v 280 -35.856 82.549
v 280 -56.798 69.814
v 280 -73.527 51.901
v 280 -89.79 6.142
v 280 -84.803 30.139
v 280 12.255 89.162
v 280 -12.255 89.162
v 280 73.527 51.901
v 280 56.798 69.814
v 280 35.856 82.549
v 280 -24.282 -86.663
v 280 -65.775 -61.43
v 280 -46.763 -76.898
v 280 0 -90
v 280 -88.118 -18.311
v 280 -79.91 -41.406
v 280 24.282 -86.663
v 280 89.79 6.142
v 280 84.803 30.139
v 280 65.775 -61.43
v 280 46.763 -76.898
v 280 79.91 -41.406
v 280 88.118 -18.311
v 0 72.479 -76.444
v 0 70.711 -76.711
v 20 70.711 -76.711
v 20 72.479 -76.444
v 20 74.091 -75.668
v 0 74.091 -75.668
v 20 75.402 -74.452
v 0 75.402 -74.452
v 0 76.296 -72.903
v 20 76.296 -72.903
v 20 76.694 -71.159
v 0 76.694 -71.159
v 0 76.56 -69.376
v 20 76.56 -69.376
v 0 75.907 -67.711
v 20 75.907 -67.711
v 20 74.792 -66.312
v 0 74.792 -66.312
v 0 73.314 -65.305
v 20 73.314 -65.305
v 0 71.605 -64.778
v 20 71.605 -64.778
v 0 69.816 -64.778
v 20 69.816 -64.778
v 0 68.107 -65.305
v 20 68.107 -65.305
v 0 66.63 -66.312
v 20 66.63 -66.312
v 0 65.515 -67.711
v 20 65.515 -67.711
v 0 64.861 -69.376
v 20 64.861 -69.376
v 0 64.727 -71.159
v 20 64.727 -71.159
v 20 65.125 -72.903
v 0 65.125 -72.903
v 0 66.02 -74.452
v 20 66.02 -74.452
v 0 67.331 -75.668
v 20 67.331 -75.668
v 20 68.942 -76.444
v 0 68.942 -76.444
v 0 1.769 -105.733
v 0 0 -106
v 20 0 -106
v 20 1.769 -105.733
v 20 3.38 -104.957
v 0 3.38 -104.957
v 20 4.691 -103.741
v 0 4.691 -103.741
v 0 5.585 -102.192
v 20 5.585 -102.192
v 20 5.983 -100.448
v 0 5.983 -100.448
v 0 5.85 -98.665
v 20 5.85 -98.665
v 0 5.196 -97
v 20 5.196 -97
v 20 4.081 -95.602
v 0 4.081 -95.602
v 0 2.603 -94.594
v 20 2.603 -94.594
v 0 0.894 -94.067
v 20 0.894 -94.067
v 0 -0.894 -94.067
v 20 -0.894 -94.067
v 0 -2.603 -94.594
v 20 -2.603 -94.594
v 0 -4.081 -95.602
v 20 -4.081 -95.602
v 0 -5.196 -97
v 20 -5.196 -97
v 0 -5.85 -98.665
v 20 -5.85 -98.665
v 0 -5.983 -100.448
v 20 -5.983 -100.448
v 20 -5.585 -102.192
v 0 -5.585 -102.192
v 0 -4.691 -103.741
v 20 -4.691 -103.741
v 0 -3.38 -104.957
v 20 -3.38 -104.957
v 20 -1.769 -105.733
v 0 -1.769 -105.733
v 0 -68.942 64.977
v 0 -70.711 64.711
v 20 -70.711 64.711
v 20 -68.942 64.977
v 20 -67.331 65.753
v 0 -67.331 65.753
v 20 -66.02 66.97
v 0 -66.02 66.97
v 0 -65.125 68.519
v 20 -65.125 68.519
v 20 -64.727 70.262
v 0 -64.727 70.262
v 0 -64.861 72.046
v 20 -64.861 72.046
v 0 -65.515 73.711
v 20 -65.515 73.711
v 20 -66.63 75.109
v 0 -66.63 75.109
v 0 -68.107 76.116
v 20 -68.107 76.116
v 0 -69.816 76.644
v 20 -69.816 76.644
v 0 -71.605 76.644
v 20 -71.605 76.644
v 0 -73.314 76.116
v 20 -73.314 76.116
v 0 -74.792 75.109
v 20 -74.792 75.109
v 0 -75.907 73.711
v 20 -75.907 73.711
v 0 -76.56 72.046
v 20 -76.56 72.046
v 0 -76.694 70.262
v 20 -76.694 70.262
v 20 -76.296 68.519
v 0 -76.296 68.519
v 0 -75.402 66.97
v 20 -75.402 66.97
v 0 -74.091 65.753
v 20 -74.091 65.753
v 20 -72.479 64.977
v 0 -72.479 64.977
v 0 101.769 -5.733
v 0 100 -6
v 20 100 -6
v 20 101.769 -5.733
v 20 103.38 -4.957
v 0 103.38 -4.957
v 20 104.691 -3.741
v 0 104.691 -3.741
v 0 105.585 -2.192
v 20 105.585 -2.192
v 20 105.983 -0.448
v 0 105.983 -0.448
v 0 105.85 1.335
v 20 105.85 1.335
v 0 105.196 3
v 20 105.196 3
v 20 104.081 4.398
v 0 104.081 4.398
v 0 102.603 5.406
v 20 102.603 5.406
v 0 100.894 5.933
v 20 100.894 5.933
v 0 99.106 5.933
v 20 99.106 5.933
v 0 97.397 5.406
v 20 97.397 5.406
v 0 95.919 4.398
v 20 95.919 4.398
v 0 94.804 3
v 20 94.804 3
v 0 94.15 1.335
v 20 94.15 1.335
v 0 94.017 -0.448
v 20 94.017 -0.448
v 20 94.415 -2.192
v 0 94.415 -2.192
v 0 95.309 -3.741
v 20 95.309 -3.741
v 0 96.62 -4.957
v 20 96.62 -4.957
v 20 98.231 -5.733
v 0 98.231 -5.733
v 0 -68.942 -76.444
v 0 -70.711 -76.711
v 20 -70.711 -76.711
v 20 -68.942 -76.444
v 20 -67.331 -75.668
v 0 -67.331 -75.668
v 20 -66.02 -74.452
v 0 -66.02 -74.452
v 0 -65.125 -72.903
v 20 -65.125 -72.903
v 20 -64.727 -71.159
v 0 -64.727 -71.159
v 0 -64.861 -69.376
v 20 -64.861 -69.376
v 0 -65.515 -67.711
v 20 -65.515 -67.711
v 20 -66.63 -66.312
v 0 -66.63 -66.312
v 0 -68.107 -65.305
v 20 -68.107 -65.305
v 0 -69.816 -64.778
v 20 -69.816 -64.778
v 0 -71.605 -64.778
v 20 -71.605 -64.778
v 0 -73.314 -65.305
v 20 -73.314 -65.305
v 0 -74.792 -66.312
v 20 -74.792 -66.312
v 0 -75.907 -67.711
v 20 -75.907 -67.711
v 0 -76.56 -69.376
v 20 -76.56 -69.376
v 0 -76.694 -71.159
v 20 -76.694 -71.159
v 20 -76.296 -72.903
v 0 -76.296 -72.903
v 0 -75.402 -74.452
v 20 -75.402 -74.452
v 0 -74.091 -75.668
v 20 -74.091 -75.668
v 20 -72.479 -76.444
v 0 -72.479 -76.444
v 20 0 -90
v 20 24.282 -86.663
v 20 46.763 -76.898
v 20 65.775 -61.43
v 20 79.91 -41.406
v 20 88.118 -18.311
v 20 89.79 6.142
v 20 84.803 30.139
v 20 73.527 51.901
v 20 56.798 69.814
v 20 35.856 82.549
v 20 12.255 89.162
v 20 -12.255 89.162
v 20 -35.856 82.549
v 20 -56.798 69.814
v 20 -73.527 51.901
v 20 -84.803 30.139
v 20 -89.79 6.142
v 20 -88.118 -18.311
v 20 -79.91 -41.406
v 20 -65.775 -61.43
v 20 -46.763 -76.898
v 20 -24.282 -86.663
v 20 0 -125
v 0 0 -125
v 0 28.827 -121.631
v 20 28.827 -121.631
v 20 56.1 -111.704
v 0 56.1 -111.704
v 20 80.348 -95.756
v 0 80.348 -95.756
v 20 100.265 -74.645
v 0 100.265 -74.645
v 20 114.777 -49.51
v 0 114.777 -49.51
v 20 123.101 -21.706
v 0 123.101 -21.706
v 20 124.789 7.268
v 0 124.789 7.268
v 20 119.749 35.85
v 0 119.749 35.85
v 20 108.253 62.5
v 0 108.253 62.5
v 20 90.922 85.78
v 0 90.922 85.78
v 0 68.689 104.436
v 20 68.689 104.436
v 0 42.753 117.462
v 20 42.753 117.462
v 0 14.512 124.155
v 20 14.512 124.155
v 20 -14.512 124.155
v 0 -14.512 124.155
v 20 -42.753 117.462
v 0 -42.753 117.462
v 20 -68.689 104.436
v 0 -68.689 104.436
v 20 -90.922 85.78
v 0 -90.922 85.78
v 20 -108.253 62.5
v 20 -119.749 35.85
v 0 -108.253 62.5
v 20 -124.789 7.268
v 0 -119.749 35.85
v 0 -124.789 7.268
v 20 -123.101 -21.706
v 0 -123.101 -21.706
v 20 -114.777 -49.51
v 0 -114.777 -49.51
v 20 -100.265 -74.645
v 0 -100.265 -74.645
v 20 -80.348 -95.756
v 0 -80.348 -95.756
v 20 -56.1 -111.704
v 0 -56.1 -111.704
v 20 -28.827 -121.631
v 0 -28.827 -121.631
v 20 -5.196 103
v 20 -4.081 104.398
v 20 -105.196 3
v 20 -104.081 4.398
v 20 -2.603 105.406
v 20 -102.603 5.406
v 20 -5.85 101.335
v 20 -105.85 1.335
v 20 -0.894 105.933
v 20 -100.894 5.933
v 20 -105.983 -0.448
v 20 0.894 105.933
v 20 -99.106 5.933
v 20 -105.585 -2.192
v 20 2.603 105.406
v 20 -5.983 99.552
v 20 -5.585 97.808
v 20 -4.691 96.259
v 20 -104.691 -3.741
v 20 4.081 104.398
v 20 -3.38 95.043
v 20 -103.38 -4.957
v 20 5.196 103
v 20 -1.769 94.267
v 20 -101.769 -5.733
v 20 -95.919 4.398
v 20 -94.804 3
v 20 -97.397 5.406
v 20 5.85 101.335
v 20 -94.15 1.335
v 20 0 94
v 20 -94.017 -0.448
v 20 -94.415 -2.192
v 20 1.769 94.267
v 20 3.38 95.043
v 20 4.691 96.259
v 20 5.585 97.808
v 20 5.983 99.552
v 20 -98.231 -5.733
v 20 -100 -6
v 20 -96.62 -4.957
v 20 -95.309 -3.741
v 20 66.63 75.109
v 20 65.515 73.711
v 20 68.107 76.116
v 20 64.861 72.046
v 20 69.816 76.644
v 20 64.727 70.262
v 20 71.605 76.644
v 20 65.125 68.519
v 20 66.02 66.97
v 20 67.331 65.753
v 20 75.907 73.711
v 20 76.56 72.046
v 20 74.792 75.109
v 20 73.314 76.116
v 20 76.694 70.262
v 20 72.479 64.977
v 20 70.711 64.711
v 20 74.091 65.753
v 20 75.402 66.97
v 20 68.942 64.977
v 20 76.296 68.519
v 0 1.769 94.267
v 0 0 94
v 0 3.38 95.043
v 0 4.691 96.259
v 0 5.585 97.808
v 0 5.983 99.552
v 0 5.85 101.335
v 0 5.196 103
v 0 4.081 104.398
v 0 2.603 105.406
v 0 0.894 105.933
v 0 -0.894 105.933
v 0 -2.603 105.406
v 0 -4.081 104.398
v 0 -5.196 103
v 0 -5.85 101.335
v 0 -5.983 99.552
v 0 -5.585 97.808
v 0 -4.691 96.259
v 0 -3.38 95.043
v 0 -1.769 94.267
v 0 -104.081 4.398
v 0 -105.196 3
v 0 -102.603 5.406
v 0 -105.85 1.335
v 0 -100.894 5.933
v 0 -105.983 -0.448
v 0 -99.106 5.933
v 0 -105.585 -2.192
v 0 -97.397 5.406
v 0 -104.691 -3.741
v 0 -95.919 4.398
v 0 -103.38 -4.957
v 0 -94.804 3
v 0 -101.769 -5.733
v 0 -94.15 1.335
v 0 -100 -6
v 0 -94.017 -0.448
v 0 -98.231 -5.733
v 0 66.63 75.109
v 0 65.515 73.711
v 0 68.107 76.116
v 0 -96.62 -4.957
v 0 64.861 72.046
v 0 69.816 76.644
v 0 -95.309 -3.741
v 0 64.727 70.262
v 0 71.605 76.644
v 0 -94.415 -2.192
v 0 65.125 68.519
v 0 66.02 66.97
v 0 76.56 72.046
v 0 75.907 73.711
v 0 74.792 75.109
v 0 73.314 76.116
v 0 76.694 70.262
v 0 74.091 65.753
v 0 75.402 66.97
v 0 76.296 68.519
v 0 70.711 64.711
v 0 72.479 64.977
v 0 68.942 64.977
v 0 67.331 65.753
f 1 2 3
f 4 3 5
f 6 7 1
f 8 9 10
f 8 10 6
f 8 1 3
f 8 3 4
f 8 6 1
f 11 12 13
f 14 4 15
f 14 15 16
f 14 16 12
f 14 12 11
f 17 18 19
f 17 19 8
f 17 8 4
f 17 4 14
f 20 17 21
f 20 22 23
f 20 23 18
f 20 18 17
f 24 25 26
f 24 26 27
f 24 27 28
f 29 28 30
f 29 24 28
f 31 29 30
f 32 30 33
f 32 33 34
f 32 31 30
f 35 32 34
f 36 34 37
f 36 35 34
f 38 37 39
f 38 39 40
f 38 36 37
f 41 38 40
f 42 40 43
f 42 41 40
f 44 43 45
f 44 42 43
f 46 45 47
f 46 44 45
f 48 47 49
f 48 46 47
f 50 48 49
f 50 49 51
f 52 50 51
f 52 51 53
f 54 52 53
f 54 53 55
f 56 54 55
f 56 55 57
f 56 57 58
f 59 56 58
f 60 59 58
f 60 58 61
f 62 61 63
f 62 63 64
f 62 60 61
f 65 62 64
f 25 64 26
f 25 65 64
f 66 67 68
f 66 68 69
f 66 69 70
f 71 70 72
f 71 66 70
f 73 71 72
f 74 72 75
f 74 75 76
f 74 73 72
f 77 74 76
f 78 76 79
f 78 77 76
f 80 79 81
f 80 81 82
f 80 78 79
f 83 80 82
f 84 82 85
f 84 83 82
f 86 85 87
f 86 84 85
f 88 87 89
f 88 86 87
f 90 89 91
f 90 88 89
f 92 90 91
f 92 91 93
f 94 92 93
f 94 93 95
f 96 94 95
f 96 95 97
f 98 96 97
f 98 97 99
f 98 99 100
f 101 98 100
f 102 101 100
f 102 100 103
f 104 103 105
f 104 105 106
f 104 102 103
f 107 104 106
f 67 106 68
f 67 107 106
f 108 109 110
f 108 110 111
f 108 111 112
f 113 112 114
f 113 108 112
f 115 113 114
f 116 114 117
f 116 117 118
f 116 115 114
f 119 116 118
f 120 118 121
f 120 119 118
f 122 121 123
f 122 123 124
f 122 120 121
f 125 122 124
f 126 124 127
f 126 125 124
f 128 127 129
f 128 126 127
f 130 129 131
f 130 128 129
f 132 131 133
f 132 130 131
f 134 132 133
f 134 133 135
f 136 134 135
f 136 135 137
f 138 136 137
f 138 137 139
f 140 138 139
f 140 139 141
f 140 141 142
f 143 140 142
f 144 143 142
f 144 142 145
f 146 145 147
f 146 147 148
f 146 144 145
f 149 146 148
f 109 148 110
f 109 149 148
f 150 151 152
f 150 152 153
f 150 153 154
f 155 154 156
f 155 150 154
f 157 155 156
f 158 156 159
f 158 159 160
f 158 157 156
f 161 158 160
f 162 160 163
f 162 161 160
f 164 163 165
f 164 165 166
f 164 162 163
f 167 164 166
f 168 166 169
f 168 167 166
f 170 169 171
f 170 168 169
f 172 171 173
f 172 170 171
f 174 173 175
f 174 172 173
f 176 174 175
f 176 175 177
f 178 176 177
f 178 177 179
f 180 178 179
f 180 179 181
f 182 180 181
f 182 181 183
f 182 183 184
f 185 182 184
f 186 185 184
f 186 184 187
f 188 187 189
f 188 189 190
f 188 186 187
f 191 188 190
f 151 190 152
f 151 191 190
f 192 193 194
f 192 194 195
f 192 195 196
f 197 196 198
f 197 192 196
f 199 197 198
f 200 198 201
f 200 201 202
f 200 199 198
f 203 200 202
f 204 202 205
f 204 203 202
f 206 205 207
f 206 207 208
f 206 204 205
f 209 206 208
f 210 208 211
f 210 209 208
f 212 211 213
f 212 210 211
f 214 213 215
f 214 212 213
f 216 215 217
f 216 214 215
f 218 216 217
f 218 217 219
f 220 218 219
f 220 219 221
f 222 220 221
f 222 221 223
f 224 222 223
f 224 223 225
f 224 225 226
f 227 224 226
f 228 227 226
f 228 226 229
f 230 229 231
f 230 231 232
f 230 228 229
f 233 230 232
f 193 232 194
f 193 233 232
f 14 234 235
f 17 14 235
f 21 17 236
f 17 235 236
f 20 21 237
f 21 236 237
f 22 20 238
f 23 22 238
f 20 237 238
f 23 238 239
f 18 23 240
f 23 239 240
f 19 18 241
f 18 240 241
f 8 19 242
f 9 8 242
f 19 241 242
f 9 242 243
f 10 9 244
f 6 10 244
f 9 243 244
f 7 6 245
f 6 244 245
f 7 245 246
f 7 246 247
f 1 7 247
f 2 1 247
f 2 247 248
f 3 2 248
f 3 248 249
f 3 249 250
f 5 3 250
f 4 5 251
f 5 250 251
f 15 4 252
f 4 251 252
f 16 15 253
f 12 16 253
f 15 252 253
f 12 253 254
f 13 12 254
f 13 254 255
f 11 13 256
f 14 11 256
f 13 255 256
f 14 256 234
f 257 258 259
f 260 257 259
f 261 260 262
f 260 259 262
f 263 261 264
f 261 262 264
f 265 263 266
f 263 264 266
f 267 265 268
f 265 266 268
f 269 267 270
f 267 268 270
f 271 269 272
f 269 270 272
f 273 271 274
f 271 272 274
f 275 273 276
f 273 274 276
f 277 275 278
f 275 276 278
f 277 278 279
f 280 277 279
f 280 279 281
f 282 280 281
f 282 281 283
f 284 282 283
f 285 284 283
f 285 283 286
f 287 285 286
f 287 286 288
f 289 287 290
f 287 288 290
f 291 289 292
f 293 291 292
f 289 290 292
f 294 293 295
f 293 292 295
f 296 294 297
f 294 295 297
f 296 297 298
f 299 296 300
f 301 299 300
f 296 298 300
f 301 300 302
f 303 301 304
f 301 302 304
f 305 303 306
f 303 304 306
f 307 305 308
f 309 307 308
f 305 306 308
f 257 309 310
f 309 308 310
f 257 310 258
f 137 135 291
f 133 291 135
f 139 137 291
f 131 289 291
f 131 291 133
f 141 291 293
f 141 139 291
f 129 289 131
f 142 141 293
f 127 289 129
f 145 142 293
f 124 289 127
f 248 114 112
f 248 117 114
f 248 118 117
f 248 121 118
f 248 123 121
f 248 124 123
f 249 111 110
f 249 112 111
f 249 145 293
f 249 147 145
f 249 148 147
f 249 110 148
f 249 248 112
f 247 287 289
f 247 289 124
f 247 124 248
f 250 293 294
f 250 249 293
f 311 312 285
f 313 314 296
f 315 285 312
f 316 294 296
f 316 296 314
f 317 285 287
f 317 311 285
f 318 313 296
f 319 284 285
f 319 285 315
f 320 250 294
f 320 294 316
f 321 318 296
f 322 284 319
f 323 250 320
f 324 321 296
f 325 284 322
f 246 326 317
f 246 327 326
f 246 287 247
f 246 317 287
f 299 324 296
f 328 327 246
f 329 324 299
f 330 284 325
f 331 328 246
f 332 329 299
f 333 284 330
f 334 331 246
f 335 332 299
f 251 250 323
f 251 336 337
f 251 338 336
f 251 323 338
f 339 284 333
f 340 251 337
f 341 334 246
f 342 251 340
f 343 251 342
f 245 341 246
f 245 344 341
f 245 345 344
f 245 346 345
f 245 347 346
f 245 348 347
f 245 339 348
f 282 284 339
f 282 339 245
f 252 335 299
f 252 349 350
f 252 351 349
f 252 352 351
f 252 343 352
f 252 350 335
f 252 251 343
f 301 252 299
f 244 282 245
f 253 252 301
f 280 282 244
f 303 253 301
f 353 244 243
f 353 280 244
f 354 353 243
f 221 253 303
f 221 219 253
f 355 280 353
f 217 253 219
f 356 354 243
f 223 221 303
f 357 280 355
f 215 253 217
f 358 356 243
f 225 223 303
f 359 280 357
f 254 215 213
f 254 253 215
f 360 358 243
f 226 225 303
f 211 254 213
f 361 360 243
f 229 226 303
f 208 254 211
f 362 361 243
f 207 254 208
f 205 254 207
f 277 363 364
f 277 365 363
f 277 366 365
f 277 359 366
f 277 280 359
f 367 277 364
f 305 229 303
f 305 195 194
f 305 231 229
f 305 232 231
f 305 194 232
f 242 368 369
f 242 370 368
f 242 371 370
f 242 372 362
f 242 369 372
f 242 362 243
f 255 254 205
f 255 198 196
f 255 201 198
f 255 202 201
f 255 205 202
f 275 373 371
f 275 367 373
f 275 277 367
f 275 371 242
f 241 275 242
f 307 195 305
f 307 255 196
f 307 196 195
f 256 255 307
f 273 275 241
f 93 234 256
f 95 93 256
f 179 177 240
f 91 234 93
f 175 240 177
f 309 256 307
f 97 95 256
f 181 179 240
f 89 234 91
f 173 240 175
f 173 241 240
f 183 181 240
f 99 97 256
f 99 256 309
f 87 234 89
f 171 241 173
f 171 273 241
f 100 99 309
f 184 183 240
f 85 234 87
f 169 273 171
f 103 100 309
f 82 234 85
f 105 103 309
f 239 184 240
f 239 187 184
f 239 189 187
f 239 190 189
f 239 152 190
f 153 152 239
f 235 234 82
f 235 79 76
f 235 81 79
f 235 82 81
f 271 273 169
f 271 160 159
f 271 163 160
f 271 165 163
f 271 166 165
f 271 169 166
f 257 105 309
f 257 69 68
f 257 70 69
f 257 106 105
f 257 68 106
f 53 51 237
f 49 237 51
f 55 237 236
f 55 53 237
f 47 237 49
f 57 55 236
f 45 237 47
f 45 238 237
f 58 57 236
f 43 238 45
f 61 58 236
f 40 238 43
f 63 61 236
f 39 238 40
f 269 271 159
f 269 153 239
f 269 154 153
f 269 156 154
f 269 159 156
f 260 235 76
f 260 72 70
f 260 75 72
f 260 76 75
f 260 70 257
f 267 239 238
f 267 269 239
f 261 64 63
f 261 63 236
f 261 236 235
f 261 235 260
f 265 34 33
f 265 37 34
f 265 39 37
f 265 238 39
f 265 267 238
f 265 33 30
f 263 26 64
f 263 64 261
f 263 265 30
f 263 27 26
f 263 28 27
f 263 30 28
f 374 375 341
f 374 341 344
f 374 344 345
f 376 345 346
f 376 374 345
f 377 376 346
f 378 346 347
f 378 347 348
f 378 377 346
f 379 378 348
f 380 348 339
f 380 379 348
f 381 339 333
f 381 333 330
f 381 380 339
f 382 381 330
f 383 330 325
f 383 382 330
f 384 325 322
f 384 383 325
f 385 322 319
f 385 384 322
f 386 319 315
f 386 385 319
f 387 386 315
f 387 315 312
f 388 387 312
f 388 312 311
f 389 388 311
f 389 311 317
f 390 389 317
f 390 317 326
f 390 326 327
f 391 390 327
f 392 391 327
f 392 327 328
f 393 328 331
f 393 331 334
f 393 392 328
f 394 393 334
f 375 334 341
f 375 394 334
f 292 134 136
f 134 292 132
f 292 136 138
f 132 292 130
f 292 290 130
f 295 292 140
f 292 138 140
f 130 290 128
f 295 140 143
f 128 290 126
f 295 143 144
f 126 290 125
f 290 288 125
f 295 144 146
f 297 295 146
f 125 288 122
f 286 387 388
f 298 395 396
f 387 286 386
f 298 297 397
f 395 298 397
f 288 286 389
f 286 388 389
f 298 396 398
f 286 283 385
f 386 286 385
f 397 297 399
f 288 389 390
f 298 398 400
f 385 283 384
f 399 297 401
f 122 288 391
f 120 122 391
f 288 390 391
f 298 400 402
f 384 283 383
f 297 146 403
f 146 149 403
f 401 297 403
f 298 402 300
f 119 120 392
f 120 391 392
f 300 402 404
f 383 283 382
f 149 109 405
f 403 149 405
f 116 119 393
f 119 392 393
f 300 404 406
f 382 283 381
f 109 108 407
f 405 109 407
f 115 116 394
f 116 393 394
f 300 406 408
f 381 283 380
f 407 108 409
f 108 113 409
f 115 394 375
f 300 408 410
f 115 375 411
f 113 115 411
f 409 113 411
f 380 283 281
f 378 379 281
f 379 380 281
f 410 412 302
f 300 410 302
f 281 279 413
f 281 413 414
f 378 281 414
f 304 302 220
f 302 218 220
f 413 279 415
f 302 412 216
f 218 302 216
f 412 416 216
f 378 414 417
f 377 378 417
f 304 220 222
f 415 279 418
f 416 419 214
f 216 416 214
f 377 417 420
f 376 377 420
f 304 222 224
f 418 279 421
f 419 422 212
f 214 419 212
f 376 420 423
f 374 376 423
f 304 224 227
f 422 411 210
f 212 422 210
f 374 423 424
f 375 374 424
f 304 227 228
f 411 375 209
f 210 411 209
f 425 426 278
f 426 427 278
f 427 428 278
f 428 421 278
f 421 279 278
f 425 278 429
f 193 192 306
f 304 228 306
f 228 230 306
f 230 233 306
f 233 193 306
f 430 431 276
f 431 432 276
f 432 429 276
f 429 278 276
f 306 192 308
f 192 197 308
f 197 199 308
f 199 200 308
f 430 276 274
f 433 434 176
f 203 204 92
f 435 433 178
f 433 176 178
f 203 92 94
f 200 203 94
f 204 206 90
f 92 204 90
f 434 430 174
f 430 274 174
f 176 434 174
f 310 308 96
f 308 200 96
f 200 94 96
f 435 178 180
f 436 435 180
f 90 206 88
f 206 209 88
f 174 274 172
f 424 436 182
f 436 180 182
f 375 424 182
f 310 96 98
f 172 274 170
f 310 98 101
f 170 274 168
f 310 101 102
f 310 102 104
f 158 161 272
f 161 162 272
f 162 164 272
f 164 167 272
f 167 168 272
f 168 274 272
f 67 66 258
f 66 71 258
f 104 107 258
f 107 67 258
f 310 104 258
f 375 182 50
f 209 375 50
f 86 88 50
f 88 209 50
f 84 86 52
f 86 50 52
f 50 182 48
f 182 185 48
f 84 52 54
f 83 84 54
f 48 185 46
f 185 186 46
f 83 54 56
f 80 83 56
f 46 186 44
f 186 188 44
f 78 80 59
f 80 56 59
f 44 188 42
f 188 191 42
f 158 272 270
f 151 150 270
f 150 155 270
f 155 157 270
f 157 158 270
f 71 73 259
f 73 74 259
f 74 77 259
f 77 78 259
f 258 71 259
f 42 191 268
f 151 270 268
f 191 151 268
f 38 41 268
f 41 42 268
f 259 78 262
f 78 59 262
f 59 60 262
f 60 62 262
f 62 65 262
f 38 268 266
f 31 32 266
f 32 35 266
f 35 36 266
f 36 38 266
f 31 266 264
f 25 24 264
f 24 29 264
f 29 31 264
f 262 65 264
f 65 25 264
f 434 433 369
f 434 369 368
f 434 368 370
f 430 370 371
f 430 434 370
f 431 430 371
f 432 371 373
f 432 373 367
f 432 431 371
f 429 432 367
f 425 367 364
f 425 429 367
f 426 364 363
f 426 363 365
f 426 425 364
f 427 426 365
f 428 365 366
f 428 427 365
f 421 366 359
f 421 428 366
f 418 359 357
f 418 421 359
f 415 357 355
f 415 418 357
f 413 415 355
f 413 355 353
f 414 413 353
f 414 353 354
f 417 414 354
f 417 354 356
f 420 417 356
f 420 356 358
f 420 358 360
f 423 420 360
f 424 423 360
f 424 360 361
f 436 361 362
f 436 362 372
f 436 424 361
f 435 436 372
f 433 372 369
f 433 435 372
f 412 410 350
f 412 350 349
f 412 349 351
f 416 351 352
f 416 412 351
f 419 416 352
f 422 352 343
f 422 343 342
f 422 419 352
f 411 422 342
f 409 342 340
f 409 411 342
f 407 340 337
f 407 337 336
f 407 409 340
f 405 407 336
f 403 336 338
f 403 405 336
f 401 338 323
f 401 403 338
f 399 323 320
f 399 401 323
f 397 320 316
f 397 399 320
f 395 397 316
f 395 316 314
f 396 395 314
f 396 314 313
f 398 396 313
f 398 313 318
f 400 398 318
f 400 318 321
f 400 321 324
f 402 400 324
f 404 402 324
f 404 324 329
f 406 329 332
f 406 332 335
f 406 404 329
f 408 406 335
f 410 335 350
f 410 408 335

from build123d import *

# Parameters (mm, degrees)
CROQUIS1_R              = 125
CROQUIS1_R_2            = 6
SALIENTE_EXTRUIR1_DEPTH = 20
CROQUIS2_R              = 90
SALIENTE_EXTRUIR2_DEPTH = 260


with BuildPart() as part:
    # Croquis1 → Saliente-Extruir1 (new body)
    with BuildSketch(Plane(origin=(0, 0, 0), x_dir=(0, 0, -1), z_dir=(1, 0, 0))):
        Circle(CROQUIS1_R)
        with Locations((0, -100)):
            Circle(CROQUIS1_R_2, mode=Mode.SUBTRACT)
        with Locations((-70.710678119, -70.710678119)):
            Circle(CROQUIS1_R_2, mode=Mode.SUBTRACT)
        with Locations((-100, 0)):
            Circle(CROQUIS1_R_2, mode=Mode.SUBTRACT)
        with Locations((-70.710678119, 70.710678119)):
            Circle(CROQUIS1_R_2, mode=Mode.SUBTRACT)
        with Locations((0, 100)):
            Circle(CROQUIS1_R_2, mode=Mode.SUBTRACT)
        with Locations((70.710678119, 70.710678119)):
            Circle(CROQUIS1_R_2, mode=Mode.SUBTRACT)
        with Locations((100, 0)):
            Circle(CROQUIS1_R_2, mode=Mode.SUBTRACT)
        with Locations((70.710678119, -70.710678119)):
            Circle(CROQUIS1_R_2, mode=Mode.SUBTRACT)
    extrude(amount=SALIENTE_EXTRUIR1_DEPTH)

    # Croquis2 → Saliente-Extruir2 (add)
    with BuildSketch(Plane(origin=(20, 0, 0), x_dir=(0, 0, -1), z_dir=(1, 0, 0))):
        Circle(CROQUIS2_R)
    extrude(amount=SALIENTE_EXTRUIR2_DEPTH)


solid = part.part
